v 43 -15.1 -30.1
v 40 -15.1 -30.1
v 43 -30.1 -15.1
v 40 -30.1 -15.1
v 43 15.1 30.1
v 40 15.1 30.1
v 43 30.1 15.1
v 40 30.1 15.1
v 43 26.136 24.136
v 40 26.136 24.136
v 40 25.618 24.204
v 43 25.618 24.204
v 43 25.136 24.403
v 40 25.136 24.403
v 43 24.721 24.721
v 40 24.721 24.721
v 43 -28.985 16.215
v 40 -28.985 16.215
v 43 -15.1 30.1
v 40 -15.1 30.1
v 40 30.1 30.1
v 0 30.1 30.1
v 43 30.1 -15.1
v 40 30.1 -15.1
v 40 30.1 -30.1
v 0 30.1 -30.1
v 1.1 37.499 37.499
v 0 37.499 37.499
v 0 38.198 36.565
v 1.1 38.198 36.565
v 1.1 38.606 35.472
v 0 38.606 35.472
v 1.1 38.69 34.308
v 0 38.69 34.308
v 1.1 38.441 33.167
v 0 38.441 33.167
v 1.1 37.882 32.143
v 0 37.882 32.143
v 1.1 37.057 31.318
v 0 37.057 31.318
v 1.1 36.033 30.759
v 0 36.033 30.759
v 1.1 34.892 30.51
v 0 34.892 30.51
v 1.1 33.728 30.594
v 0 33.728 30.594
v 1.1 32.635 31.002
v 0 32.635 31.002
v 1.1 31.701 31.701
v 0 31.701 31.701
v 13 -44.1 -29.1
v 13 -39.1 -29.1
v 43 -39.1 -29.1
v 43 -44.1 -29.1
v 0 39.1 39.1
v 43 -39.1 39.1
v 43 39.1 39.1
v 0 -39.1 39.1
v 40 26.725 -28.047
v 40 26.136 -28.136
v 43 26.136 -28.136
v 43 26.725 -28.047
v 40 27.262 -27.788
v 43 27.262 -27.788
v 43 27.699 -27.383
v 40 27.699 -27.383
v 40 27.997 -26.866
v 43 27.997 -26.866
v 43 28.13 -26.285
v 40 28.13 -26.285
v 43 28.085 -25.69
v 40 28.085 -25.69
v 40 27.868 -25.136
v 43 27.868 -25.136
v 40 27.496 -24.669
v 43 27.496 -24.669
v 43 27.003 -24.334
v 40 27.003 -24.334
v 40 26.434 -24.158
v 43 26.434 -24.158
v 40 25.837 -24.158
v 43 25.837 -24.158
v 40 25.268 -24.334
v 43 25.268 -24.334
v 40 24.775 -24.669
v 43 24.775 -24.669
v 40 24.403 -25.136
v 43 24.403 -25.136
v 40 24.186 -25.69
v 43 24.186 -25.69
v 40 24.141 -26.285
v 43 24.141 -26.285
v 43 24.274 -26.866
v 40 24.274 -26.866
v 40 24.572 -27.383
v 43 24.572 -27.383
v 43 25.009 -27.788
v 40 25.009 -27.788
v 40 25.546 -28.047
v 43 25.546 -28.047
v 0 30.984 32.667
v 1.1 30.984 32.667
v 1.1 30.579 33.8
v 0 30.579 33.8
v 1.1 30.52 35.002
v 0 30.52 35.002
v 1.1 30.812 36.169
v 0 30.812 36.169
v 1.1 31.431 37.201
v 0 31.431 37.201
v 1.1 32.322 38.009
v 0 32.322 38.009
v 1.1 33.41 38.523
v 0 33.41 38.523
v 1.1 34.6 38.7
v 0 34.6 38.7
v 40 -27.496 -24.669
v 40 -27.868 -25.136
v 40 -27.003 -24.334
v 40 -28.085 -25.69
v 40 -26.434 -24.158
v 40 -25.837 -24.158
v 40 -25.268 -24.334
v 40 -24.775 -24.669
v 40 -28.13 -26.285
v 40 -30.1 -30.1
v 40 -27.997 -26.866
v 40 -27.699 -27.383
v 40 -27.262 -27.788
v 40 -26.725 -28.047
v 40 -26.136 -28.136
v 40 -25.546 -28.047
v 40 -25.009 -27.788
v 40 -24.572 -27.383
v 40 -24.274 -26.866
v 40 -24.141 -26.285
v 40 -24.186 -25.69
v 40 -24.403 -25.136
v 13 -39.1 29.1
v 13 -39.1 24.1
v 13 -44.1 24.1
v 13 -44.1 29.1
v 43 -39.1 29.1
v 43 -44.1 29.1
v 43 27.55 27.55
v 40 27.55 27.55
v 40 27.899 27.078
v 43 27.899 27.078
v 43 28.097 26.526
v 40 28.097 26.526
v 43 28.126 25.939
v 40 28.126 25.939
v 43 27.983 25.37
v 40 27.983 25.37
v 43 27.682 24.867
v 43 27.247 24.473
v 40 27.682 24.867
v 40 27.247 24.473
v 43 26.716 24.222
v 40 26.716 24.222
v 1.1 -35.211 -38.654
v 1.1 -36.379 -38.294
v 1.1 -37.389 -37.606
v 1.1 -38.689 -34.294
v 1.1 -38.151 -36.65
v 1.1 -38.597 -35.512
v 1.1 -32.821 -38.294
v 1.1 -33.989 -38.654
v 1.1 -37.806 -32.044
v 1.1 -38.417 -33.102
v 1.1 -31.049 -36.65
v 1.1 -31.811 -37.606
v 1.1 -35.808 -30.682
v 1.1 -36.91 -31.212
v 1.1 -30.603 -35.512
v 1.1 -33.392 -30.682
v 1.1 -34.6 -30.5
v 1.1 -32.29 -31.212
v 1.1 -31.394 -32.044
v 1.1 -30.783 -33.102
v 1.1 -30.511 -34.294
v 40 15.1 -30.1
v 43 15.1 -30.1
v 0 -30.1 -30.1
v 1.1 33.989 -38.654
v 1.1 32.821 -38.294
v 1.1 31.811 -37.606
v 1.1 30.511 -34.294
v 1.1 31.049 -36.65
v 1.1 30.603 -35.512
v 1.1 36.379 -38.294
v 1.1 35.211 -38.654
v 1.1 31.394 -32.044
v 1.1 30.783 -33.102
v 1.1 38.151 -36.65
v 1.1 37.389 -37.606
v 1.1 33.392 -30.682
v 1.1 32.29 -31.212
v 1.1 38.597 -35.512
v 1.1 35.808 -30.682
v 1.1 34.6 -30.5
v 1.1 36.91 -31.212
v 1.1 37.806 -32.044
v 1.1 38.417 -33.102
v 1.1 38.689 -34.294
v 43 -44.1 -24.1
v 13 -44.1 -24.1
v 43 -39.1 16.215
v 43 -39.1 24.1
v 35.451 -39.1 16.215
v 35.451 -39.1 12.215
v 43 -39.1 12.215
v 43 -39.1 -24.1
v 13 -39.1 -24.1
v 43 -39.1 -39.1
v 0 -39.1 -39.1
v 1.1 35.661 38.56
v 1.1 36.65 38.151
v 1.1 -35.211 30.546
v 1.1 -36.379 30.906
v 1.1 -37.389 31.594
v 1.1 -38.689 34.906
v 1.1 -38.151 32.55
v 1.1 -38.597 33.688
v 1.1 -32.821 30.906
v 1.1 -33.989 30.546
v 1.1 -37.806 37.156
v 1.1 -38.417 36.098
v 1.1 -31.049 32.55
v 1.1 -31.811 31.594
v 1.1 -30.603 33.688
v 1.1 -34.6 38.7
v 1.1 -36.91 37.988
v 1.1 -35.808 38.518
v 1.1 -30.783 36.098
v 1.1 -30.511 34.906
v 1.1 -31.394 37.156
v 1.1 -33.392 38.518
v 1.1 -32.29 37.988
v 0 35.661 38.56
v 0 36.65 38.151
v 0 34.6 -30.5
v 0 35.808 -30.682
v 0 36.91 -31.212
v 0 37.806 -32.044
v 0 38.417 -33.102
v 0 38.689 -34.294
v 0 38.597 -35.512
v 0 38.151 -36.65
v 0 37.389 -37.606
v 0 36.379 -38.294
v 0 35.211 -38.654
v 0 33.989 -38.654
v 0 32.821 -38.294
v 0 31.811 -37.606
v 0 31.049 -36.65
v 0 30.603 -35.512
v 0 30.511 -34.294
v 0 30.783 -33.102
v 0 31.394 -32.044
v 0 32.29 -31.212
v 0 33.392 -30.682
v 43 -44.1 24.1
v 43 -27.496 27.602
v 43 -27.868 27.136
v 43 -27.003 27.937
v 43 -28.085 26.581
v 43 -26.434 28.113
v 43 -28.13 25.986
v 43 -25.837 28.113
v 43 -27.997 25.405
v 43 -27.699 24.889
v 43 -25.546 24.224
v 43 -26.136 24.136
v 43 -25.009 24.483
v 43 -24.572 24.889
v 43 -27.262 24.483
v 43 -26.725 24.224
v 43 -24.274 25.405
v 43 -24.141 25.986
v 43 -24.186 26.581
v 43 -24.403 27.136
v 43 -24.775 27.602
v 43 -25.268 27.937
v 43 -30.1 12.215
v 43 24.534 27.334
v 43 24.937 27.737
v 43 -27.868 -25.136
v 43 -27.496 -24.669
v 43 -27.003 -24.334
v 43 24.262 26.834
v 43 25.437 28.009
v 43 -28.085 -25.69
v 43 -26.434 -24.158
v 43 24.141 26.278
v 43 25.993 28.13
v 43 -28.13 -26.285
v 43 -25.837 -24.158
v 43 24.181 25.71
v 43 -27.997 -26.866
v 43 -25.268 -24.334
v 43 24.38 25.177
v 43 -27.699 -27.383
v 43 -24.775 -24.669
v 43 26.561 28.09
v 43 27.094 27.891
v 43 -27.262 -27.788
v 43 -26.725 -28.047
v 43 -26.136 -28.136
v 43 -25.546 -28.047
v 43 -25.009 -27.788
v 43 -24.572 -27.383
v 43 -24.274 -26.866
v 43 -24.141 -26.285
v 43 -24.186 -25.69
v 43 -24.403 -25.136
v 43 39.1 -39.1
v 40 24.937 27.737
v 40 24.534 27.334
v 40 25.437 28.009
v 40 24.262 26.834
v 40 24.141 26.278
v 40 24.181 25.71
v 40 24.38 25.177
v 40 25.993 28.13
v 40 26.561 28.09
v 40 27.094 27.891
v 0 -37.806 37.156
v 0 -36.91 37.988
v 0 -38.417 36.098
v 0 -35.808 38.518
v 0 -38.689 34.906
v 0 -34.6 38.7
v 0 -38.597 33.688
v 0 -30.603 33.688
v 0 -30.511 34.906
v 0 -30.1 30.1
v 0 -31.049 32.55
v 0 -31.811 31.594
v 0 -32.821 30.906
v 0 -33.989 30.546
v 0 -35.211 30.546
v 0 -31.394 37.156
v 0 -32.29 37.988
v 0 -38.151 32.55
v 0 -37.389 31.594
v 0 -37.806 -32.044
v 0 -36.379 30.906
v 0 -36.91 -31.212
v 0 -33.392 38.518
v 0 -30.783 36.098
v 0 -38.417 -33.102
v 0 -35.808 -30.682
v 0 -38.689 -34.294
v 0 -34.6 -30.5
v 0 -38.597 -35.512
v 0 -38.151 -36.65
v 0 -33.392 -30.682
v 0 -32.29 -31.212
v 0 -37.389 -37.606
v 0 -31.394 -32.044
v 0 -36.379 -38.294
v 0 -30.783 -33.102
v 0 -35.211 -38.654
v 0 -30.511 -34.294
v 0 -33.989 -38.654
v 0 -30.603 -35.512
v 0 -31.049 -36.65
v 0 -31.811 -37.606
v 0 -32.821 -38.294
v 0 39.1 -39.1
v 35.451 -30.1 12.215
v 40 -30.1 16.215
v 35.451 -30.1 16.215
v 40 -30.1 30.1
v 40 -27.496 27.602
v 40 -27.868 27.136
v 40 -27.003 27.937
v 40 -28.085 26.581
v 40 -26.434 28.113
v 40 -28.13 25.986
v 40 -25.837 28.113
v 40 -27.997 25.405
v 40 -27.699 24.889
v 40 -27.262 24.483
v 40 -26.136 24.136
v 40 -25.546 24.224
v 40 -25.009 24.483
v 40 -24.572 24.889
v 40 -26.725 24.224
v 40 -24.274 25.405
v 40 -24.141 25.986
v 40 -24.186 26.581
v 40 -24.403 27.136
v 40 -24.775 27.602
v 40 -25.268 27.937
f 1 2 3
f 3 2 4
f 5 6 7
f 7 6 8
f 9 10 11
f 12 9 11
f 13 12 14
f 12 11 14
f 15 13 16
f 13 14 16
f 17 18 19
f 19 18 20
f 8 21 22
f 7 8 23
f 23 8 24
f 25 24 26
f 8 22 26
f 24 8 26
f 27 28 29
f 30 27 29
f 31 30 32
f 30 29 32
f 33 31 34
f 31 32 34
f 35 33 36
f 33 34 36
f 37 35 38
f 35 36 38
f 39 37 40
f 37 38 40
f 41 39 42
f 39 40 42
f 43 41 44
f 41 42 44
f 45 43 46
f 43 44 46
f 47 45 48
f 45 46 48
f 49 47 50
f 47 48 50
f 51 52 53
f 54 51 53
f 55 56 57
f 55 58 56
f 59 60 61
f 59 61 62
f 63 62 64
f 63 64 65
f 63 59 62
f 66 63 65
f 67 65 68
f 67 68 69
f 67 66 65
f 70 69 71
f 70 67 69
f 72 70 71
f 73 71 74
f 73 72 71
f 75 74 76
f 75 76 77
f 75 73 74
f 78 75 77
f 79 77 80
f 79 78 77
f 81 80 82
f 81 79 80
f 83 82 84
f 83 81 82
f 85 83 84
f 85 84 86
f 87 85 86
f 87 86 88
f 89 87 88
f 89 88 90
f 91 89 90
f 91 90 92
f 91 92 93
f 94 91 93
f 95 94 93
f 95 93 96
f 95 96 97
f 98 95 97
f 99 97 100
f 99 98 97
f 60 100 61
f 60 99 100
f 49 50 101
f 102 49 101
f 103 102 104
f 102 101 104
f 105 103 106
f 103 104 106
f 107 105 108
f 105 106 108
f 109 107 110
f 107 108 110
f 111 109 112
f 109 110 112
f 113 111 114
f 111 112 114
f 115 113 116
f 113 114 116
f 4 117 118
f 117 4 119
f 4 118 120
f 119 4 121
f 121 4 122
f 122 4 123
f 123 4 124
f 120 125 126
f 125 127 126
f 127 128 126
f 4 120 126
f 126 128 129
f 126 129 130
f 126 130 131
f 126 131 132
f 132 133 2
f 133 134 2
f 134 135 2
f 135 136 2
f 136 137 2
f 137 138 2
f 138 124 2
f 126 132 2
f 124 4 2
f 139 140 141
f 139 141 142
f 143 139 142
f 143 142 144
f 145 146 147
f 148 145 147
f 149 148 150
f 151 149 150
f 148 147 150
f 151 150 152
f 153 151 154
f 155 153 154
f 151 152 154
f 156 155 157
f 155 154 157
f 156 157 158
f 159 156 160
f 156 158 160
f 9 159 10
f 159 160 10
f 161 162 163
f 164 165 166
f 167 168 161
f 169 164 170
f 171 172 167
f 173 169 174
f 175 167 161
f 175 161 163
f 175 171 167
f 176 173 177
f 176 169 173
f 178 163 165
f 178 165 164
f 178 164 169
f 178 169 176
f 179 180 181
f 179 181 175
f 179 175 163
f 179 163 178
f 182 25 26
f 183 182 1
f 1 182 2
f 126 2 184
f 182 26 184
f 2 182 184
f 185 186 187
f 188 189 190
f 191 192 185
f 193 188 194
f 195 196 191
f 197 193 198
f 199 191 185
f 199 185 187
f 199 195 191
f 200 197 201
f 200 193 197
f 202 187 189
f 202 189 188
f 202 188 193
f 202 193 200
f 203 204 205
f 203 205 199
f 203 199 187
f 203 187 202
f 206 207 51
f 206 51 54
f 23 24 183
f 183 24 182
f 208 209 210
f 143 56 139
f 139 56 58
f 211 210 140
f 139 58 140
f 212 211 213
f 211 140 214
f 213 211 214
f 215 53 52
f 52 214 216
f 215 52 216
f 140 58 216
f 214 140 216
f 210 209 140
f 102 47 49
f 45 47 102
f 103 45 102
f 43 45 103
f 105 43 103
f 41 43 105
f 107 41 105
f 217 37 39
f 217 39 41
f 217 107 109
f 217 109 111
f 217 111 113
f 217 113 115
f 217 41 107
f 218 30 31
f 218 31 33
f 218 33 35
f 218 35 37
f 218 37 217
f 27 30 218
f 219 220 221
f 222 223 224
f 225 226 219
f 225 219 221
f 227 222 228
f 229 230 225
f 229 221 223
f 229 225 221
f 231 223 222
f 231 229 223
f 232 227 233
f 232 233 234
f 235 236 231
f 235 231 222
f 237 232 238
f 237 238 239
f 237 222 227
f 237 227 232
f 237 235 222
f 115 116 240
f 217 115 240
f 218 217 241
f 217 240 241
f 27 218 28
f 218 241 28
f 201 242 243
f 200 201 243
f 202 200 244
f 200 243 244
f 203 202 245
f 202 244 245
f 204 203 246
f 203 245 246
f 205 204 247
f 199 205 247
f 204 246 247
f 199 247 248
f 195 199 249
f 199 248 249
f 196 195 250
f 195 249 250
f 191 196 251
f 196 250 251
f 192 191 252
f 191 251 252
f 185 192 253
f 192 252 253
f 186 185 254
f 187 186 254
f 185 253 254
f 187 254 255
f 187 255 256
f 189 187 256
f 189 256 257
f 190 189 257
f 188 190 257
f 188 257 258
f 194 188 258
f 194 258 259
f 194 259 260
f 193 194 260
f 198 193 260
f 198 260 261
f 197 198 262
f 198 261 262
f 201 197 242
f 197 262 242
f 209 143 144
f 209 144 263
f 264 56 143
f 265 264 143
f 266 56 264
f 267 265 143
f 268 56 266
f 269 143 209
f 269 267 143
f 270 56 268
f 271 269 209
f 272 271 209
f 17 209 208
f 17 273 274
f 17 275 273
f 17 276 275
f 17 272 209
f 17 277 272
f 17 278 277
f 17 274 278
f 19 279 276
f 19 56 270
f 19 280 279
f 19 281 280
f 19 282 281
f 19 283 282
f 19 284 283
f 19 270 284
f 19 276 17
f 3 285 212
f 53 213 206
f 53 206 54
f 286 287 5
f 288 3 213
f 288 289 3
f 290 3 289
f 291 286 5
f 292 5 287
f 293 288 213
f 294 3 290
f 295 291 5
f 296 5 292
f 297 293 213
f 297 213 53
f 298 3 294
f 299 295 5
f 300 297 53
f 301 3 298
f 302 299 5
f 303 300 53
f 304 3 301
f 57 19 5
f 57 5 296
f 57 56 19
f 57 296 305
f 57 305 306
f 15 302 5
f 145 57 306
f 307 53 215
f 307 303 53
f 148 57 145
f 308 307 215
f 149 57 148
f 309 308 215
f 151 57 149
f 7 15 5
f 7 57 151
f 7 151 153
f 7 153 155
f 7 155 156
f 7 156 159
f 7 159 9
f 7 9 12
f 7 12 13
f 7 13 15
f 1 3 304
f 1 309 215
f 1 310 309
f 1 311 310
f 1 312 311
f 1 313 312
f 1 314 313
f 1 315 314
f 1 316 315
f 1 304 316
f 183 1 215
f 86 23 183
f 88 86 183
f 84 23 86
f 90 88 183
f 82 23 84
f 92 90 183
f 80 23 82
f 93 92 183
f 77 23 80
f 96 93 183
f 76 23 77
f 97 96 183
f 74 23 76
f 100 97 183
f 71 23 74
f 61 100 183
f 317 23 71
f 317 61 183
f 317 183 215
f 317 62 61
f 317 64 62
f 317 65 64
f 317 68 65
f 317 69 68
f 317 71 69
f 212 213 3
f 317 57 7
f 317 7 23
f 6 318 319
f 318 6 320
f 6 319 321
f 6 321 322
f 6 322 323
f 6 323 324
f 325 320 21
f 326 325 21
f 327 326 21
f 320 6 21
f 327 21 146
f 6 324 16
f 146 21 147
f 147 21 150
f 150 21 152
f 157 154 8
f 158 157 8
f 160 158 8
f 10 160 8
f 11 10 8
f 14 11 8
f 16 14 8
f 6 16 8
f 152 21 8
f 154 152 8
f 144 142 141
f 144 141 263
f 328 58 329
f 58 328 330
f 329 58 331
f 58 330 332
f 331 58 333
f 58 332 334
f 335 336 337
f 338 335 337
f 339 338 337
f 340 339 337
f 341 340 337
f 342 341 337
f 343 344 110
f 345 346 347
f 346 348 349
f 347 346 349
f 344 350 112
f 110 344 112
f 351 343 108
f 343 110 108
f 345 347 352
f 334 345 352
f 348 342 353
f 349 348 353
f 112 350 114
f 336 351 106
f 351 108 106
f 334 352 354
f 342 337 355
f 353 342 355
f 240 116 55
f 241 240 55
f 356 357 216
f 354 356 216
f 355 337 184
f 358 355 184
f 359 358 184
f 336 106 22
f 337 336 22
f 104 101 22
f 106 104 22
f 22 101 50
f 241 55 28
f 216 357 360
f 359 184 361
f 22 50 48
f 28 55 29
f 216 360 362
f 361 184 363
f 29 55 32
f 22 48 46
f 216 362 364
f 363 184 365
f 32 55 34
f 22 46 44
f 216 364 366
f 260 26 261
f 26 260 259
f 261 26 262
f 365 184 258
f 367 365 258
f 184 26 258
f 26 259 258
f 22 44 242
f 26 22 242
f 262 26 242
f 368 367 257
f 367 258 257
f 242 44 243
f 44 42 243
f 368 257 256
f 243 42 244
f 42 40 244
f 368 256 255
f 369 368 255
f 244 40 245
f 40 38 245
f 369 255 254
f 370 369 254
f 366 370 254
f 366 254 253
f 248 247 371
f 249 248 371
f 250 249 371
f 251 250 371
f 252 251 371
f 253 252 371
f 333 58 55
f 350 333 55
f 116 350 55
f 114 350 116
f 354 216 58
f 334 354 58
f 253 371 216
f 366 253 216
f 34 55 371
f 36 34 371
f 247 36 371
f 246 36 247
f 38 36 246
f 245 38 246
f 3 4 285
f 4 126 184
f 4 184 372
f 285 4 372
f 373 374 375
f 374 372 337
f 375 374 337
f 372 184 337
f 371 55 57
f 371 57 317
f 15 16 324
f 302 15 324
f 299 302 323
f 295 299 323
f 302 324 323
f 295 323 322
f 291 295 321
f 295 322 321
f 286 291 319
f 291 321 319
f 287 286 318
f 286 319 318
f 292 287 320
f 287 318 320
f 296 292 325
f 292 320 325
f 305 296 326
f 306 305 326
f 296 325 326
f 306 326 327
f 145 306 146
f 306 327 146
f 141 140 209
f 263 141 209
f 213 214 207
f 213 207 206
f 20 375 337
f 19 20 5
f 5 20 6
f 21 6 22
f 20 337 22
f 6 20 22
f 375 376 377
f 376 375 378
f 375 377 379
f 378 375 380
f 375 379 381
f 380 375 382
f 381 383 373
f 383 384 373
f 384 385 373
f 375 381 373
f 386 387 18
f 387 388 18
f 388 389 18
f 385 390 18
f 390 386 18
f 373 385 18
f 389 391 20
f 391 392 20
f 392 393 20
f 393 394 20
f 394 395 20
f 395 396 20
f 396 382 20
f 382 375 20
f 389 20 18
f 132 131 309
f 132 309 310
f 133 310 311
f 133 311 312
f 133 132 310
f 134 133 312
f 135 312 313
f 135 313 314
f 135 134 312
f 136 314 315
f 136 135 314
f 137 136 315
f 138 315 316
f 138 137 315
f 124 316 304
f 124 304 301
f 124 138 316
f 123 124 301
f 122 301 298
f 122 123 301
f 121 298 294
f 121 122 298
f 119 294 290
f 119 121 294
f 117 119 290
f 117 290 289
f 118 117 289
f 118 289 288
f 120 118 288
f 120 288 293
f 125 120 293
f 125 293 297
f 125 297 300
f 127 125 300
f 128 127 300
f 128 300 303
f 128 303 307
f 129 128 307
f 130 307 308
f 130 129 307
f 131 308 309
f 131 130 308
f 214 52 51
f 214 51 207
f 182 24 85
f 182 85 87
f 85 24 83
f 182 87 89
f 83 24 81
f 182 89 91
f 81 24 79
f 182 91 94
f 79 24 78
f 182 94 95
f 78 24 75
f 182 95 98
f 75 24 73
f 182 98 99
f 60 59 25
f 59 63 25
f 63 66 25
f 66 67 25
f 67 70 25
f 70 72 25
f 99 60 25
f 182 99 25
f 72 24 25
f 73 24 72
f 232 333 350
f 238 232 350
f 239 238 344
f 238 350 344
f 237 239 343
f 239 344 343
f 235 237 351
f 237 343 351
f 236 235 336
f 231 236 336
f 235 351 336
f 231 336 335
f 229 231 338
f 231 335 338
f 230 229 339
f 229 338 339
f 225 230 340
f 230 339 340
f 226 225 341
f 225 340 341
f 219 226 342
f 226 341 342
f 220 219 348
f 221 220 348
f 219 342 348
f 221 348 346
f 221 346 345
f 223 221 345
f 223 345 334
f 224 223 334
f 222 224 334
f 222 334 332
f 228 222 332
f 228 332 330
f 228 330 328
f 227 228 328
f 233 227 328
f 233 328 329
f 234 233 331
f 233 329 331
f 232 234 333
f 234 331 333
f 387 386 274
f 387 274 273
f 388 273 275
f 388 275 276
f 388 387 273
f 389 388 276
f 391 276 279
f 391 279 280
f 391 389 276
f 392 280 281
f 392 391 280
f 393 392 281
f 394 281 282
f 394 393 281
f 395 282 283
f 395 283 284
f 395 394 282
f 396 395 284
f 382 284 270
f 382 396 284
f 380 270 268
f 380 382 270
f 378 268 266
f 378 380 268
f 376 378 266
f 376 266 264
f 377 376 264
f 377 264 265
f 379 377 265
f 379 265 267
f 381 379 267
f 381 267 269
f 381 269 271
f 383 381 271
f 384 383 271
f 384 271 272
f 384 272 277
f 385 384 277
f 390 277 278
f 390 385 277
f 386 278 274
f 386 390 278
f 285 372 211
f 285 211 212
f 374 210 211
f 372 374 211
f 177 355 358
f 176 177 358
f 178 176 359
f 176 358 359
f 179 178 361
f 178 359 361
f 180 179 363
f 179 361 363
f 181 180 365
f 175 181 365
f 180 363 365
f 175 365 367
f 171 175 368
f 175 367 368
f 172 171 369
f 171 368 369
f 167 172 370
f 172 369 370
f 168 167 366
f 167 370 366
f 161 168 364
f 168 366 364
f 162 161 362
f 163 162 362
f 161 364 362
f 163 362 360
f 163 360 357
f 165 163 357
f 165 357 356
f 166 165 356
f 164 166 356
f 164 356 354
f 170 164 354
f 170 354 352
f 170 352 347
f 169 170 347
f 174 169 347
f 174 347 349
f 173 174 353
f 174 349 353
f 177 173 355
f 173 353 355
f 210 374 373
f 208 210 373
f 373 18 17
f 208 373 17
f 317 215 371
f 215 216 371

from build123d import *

# Parameters (mm, degrees)
SKETCH1_W           = 78.2
SKETCH1_H           = 78.2
SKETCH1_W_2         = 60.2
SKETCH1_H_2         = 60.2
BOSS_EXTRUDE1_DEPTH = 40
SKETCH2_W           = 78.2
SKETCH2_H           = 78.2
SKETCH2_R           = 2
BOSS_EXTRUDE2_DEPTH = 3
SKETCH3_W           = 15.098438038
SKETCH3_H           = 4
CUT_EXTRUDE1_DEPTH  = 19
SKETCH4_R           = 4.1
CUT_EXTRUDE2_DEPTH  = 1.1
SKETCH5_W           = 30
SKETCH5_H           = 5
BOSS_EXTRUDE3_DEPTH = 5


with BuildPart() as part:
    # Sketch1 → Boss-Extrude1 (new body)
    with BuildSketch(Plane(origin=(0, 0, 0), x_dir=(0, 0, -1), z_dir=(1, 0, 0))):
        Rectangle(SKETCH1_W, SKETCH1_H)
        Rectangle(SKETCH1_W_2, SKETCH1_H_2, mode=Mode.SUBTRACT)
    extrude(amount=BOSS_EXTRUDE1_DEPTH)

    # Sketch2 → Boss-Extrude2 (add)
    # profile 1 of 6: a face of its own
    with BuildSketch(Plane(origin=(40, 0, 0), x_dir=(0, 0, -1), z_dir=(1, 0, 0))):
        Rectangle(SKETCH2_W, SKETCH2_H)
        Polygon((-30.1, 15.1), (-30.1, 30.1), (-15.1, 30.1), (15.1, 30.1), (30.1, 30.1), (30.1, 15.1), (30.1, -15.1), (30.1, -30.1), (15.1, -30.1), (-15.1, -30.1), (-30.1, -30.1), (-30.1, -15.1), align=None, mode=Mode.SUBTRACT)
    # profile 2 of 6: a face of its own
    with BuildSketch(Plane(origin=(40, 0, 0), x_dir=(0, 0, -1), z_dir=(1, 0, 0))):
        Polygon((-15.1, -30.1), (-30.1, -15.1), (-30.1, -30.1), align=None)
        with Locations((-26.135533906, -26.135533906)):
            Circle(SKETCH2_R, mode=Mode.SUBTRACT)
    # profile 3 of 6: a face of its own
    with BuildSketch(Plane(origin=(40, 0, 0), x_dir=(0, 0, -1), z_dir=(1, 0, 0))):
        Polygon((30.1, -15.1), (15.1, -30.1), (30.1, -30.1), align=None)
        with Locations((26.135533906, -26.135533906)):
            Circle(SKETCH2_R, mode=Mode.SUBTRACT)
    # profile 4 of 6: a face of its own
    with BuildSketch(Plane(origin=(40, 0, 0), x_dir=(0, 0, -1), z_dir=(1, 0, 0))):
        Polygon((30.1, 30.1), (15.1, 30.1), (30.1, 15.1), align=None)
        with Locations((26.135533906, 26.135533906)):
            Circle(SKETCH2_R, mode=Mode.SUBTRACT)
    # profile 5 of 6: a face of its own
    with BuildSketch(Plane(origin=(40, 0, 0), x_dir=(0, 0, -1), z_dir=(1, 0, 0))):
        with BuildLine():
            Line((-15.1, 30.1), (-30.1, 30.1))
            Line((-30.1, 30.1), (-27.549747468, 27.549747468))
            ThreePointArc((-27.549747468, 27.549747468), (-25.370167041, 27.983292971), (-24.135533906, 26.135533906))
            ThreePointArc((-24.135533906, 26.135533906), (-24.287774841, 25.370167041), (-24.721320344, 24.721320344))
            Line((-24.721320344, 24.721320344), (-22.6, 22.6))
            Line((-22.6, 22.6), (-15.1, 30.1))
        make_face()
    # profile 6 of 6: a face of its own
    with BuildSketch(Plane(origin=(40, 0, 0), x_dir=(0, 0, -1), z_dir=(1, 0, 0))):
        with BuildLine():
            Line((-27.549747468, 27.549747468), (-30.1, 30.1))
            Line((-30.1, 30.1), (-30.1, 15.1))
            Line((-30.1, 15.1), (-22.6, 22.6))
            Line((-22.6, 22.6), (-24.721320344, 24.721320344))
            ThreePointArc((-24.721320344, 24.721320344), (-27.549747468, 24.721320344), (-27.549747468, 27.549747468))
        make_face()
    extrude(amount=BOSS_EXTRUDE2_DEPTH)

    # Sketch3 → Cut-Extrude1 (cut, symmetric)
    with BuildSketch(Plane(origin=(0, -30.1, 0), x_dir=(1, 0, 0), z_dir=(0, 1, 0))):
        with Locations((43, -14.215479316)):
            Rectangle(SKETCH3_W, SKETCH3_H)
    extrude(amount=CUT_EXTRUDE1_DEPTH, both=True, mode=Mode.SUBTRACT)

    # Sketch4 → Cut-Extrude2 (cut, symmetric)
    with BuildSketch(Plane.ZY):
        with Locations((-34.6, 34.6)):
            Circle(SKETCH4_R)
        with Locations((-34.6, -34.6)):
            Circle(SKETCH4_R)
        with Locations((34.6, -34.6)):
            Circle(SKETCH4_R)
        with BuildLine():
            ThreePointArc((37.499137803, 37.499137803), (31.700862197, 37.499137803), (31.700862197, 31.700862197))
            Line((31.700862197, 31.700862197), (37.499137803, 37.499137803))
        make_face()
        with BuildLine():
            Line((37.499137803, 37.499137803), (31.700862197, 31.700862197))
            ThreePointArc((31.700862197, 31.700862197), (36.169002073, 30.812093917), (38.7, 34.6))
            ThreePointArc((38.7, 34.6), (38.387906083, 36.169002073), (37.499137803, 37.499137803))
        make_face()
    extrude(amount=CUT_EXTRUDE2_DEPTH, both=True, mode=Mode.SUBTRACT)

    # Sketch5 → Boss-Extrude3 (add)
    with BuildSketch(Plane.XZ.offset(39.1)):
        with Locations((28, -26.6)):
            Rectangle(SKETCH5_W, SKETCH5_H)
        with Locations((28, 26.6)):
            Rectangle(SKETCH5_W, SKETCH5_H)
    extrude(amount=BOSS_EXTRUDE3_DEPTH)


solid = part.part
